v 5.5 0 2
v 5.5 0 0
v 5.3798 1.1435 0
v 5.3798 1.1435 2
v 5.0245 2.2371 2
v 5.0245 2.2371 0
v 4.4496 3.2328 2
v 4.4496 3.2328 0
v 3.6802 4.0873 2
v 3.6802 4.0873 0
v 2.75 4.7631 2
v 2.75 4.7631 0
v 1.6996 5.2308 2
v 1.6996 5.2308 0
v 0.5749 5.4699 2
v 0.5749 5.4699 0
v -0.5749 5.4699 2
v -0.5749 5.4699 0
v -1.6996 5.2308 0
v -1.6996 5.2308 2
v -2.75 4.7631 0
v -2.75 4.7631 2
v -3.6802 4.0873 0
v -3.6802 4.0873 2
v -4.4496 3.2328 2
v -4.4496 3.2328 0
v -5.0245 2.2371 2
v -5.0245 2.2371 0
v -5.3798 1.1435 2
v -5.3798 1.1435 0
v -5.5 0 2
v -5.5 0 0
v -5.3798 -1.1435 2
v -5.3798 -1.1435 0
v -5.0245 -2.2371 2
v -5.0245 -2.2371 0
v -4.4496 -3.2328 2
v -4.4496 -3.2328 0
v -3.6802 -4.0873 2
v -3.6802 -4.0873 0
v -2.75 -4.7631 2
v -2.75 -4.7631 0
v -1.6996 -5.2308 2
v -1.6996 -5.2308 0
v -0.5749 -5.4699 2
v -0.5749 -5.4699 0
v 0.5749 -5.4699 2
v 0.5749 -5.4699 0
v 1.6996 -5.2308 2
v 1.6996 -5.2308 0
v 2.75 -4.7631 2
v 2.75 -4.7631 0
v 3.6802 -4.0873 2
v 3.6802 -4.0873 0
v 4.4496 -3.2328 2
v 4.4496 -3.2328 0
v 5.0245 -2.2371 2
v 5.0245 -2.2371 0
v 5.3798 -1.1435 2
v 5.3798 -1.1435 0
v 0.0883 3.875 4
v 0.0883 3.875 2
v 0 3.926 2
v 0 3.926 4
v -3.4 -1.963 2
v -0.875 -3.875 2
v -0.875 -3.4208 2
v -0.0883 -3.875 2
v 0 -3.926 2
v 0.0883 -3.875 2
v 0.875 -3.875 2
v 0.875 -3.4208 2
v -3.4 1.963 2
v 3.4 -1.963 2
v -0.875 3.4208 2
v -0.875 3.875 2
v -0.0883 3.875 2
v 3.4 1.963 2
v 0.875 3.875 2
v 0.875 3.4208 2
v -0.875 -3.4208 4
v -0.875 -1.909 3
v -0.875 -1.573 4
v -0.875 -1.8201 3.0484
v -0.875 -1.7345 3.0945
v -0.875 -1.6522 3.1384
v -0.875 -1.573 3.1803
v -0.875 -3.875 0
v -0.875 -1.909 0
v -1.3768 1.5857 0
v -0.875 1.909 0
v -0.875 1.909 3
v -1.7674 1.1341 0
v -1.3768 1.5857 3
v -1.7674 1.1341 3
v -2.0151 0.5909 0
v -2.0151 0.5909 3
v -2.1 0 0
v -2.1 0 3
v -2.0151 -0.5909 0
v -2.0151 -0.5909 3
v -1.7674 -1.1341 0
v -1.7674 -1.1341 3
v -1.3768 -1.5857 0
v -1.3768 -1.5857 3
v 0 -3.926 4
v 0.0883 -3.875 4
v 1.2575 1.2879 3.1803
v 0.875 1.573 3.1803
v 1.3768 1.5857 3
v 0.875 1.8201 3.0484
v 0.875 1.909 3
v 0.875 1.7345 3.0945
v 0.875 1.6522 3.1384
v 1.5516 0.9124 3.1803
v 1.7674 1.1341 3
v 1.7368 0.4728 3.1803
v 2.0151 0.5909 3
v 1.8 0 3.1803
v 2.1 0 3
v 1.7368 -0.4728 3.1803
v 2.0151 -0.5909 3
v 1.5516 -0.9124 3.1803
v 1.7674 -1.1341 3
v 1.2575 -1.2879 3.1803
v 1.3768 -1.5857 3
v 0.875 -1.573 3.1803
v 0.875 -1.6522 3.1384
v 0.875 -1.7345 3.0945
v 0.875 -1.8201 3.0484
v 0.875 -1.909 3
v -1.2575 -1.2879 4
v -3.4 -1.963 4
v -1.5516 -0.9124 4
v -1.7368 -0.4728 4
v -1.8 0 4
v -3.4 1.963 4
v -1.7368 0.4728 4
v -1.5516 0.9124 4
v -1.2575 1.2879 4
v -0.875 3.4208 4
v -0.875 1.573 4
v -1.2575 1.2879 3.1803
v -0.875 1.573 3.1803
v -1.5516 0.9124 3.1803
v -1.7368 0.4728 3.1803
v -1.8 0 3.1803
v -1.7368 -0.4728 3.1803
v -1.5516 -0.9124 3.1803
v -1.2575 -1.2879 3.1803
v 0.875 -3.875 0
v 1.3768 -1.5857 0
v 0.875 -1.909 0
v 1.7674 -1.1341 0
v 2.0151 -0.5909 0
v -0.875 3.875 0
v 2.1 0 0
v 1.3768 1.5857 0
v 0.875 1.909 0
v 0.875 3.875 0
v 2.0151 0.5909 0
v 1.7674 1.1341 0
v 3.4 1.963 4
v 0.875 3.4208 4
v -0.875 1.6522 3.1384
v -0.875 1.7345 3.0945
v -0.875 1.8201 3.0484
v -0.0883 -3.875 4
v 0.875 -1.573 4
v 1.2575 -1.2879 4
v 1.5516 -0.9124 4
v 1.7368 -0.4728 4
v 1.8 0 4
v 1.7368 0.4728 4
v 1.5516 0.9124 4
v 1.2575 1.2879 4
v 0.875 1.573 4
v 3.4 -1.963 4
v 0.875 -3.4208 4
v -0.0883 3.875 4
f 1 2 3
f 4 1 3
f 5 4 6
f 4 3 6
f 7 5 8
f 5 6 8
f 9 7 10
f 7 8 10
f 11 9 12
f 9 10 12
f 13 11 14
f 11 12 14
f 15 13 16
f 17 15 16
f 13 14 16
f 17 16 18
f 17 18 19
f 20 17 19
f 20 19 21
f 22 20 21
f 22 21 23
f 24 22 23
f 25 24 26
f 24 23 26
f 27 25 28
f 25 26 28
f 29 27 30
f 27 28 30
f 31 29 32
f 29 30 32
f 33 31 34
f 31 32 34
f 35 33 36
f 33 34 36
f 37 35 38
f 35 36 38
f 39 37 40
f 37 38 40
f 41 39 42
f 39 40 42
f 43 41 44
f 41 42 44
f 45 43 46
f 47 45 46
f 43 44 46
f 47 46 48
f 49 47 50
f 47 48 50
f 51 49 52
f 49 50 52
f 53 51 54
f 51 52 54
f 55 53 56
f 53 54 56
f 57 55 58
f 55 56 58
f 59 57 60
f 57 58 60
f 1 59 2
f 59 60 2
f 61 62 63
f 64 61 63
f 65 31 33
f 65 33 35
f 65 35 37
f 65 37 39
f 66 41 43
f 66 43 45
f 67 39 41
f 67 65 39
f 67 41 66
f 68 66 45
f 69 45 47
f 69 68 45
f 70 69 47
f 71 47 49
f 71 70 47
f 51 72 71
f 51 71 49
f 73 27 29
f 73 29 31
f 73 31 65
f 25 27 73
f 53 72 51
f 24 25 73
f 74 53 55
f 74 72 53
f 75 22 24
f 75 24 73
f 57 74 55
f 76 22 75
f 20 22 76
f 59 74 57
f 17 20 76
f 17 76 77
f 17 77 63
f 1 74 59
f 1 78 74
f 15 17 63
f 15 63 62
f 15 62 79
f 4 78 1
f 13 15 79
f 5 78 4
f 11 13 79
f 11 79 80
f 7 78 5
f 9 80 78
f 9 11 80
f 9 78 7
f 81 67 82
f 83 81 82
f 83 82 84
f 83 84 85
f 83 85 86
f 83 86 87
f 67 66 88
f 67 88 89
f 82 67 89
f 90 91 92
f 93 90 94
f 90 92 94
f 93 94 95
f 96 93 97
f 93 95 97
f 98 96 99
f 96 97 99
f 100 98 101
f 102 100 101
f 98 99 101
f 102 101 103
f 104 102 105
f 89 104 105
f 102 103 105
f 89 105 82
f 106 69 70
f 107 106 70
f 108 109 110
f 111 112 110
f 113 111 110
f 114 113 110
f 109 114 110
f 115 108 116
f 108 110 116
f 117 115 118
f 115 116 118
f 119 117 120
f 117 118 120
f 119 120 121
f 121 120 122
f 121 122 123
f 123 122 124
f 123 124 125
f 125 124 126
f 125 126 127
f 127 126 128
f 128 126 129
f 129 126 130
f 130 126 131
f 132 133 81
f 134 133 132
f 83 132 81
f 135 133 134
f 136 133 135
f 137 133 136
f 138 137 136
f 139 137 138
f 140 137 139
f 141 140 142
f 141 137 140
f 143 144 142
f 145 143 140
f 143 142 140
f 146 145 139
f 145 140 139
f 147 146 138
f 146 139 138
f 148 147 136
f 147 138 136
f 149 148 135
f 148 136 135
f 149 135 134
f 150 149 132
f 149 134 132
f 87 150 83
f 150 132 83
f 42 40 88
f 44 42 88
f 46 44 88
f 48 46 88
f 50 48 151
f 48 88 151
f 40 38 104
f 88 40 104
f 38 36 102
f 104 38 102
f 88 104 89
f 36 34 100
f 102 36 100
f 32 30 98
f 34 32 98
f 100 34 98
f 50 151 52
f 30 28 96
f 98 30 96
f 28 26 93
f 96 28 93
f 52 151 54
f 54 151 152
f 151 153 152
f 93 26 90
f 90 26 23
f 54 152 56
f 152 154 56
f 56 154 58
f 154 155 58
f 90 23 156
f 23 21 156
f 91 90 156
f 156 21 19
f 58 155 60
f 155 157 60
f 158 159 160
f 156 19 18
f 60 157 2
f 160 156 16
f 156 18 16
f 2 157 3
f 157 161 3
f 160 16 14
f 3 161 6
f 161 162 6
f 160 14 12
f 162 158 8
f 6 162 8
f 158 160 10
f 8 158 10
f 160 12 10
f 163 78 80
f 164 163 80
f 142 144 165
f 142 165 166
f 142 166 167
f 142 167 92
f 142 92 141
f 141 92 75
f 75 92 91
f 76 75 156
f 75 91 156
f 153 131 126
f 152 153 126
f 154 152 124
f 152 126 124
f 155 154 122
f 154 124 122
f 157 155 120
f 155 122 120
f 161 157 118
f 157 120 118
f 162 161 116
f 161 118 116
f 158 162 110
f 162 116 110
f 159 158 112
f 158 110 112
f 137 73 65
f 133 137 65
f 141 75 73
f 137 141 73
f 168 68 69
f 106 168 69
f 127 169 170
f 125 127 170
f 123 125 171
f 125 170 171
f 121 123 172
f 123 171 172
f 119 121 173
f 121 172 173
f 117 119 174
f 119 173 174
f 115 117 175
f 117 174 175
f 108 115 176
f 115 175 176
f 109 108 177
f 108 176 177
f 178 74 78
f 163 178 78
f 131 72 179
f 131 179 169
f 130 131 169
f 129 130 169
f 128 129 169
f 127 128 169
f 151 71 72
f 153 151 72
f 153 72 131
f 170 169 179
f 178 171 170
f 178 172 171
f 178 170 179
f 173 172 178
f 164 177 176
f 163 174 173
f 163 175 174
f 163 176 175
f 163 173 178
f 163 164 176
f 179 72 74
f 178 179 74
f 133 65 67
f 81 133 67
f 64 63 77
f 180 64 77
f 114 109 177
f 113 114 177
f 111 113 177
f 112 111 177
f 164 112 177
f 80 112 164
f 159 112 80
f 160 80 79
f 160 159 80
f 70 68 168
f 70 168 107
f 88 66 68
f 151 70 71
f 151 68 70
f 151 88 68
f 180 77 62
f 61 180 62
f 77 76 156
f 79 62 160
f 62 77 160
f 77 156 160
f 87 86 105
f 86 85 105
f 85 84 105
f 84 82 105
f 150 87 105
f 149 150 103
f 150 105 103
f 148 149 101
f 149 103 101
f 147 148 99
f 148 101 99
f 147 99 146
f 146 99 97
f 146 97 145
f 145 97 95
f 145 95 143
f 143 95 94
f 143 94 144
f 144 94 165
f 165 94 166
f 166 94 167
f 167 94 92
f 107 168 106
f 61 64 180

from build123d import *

# Parameters (mm, degrees)
F5_DEPTH  = 4
F4_R      = 5.5
F6_DEPTH  = 2
F7_W      = 1.75
F7_H      = 7.75
F8_DEPTH  = 5
F10_D     = 3.6
F11_D     = 4.2
F11_DEPTH = 3
F11_TIP   = 1.2618073


with BuildPart() as f5:
    # F4 (on Top) → F5 (new body)
    with BuildSketch(Plane.XY):
        Polygon((3.4, -1.9629909152), (3.4, 1.9629909152), (0, 3.9259818305), (-3.4, 1.9629909152), (-3.4, -1.9629909152), (0, -3.9259818305), align=None)
    extrude(amount=F5_DEPTH)

    # F4 (on Top) → F6 (join)
    with BuildSketch(Plane.XY):
        Circle(F4_R)
        Polygon((0, 3.9259818305), (3.4, 1.9629909152), (3.4, -1.9629909152), (0, -3.9259818305), (-3.4, -1.9629909152), (-3.4, 1.9629909152), align=None, mode=Mode.SUBTRACT)
    extrude(amount=F6_DEPTH)

    # F7 (on Top) → F8 (cut)
    with BuildSketch(Plane.XY):
        Rectangle(F7_W, F7_H)
    extrude(amount=F8_DEPTH, mode=Mode.SUBTRACT)

    # F10 (through all)
    with Locations(Plane(origin=(0, 0, 0), x_dir=(1, 0, 0), z_dir=(0, 0, -1))):
        with Locations((0, 0)):
            Hole(F10_D / 2)

    # F11
    with Locations(Plane(origin=(0, 0, 0), x_dir=(1, 0, 0), z_dir=(0, 0, -1))):
        with Locations((0, 0)):
            Hole(F11_D / 2, depth=F11_DEPTH)
            with Locations((0, 0, -(F11_DEPTH + F11_TIP / 2))):  # 118° drill point
                Cone(0, F11_D / 2, F11_TIP, mode=Mode.SUBTRACT)


solid = f5.part
